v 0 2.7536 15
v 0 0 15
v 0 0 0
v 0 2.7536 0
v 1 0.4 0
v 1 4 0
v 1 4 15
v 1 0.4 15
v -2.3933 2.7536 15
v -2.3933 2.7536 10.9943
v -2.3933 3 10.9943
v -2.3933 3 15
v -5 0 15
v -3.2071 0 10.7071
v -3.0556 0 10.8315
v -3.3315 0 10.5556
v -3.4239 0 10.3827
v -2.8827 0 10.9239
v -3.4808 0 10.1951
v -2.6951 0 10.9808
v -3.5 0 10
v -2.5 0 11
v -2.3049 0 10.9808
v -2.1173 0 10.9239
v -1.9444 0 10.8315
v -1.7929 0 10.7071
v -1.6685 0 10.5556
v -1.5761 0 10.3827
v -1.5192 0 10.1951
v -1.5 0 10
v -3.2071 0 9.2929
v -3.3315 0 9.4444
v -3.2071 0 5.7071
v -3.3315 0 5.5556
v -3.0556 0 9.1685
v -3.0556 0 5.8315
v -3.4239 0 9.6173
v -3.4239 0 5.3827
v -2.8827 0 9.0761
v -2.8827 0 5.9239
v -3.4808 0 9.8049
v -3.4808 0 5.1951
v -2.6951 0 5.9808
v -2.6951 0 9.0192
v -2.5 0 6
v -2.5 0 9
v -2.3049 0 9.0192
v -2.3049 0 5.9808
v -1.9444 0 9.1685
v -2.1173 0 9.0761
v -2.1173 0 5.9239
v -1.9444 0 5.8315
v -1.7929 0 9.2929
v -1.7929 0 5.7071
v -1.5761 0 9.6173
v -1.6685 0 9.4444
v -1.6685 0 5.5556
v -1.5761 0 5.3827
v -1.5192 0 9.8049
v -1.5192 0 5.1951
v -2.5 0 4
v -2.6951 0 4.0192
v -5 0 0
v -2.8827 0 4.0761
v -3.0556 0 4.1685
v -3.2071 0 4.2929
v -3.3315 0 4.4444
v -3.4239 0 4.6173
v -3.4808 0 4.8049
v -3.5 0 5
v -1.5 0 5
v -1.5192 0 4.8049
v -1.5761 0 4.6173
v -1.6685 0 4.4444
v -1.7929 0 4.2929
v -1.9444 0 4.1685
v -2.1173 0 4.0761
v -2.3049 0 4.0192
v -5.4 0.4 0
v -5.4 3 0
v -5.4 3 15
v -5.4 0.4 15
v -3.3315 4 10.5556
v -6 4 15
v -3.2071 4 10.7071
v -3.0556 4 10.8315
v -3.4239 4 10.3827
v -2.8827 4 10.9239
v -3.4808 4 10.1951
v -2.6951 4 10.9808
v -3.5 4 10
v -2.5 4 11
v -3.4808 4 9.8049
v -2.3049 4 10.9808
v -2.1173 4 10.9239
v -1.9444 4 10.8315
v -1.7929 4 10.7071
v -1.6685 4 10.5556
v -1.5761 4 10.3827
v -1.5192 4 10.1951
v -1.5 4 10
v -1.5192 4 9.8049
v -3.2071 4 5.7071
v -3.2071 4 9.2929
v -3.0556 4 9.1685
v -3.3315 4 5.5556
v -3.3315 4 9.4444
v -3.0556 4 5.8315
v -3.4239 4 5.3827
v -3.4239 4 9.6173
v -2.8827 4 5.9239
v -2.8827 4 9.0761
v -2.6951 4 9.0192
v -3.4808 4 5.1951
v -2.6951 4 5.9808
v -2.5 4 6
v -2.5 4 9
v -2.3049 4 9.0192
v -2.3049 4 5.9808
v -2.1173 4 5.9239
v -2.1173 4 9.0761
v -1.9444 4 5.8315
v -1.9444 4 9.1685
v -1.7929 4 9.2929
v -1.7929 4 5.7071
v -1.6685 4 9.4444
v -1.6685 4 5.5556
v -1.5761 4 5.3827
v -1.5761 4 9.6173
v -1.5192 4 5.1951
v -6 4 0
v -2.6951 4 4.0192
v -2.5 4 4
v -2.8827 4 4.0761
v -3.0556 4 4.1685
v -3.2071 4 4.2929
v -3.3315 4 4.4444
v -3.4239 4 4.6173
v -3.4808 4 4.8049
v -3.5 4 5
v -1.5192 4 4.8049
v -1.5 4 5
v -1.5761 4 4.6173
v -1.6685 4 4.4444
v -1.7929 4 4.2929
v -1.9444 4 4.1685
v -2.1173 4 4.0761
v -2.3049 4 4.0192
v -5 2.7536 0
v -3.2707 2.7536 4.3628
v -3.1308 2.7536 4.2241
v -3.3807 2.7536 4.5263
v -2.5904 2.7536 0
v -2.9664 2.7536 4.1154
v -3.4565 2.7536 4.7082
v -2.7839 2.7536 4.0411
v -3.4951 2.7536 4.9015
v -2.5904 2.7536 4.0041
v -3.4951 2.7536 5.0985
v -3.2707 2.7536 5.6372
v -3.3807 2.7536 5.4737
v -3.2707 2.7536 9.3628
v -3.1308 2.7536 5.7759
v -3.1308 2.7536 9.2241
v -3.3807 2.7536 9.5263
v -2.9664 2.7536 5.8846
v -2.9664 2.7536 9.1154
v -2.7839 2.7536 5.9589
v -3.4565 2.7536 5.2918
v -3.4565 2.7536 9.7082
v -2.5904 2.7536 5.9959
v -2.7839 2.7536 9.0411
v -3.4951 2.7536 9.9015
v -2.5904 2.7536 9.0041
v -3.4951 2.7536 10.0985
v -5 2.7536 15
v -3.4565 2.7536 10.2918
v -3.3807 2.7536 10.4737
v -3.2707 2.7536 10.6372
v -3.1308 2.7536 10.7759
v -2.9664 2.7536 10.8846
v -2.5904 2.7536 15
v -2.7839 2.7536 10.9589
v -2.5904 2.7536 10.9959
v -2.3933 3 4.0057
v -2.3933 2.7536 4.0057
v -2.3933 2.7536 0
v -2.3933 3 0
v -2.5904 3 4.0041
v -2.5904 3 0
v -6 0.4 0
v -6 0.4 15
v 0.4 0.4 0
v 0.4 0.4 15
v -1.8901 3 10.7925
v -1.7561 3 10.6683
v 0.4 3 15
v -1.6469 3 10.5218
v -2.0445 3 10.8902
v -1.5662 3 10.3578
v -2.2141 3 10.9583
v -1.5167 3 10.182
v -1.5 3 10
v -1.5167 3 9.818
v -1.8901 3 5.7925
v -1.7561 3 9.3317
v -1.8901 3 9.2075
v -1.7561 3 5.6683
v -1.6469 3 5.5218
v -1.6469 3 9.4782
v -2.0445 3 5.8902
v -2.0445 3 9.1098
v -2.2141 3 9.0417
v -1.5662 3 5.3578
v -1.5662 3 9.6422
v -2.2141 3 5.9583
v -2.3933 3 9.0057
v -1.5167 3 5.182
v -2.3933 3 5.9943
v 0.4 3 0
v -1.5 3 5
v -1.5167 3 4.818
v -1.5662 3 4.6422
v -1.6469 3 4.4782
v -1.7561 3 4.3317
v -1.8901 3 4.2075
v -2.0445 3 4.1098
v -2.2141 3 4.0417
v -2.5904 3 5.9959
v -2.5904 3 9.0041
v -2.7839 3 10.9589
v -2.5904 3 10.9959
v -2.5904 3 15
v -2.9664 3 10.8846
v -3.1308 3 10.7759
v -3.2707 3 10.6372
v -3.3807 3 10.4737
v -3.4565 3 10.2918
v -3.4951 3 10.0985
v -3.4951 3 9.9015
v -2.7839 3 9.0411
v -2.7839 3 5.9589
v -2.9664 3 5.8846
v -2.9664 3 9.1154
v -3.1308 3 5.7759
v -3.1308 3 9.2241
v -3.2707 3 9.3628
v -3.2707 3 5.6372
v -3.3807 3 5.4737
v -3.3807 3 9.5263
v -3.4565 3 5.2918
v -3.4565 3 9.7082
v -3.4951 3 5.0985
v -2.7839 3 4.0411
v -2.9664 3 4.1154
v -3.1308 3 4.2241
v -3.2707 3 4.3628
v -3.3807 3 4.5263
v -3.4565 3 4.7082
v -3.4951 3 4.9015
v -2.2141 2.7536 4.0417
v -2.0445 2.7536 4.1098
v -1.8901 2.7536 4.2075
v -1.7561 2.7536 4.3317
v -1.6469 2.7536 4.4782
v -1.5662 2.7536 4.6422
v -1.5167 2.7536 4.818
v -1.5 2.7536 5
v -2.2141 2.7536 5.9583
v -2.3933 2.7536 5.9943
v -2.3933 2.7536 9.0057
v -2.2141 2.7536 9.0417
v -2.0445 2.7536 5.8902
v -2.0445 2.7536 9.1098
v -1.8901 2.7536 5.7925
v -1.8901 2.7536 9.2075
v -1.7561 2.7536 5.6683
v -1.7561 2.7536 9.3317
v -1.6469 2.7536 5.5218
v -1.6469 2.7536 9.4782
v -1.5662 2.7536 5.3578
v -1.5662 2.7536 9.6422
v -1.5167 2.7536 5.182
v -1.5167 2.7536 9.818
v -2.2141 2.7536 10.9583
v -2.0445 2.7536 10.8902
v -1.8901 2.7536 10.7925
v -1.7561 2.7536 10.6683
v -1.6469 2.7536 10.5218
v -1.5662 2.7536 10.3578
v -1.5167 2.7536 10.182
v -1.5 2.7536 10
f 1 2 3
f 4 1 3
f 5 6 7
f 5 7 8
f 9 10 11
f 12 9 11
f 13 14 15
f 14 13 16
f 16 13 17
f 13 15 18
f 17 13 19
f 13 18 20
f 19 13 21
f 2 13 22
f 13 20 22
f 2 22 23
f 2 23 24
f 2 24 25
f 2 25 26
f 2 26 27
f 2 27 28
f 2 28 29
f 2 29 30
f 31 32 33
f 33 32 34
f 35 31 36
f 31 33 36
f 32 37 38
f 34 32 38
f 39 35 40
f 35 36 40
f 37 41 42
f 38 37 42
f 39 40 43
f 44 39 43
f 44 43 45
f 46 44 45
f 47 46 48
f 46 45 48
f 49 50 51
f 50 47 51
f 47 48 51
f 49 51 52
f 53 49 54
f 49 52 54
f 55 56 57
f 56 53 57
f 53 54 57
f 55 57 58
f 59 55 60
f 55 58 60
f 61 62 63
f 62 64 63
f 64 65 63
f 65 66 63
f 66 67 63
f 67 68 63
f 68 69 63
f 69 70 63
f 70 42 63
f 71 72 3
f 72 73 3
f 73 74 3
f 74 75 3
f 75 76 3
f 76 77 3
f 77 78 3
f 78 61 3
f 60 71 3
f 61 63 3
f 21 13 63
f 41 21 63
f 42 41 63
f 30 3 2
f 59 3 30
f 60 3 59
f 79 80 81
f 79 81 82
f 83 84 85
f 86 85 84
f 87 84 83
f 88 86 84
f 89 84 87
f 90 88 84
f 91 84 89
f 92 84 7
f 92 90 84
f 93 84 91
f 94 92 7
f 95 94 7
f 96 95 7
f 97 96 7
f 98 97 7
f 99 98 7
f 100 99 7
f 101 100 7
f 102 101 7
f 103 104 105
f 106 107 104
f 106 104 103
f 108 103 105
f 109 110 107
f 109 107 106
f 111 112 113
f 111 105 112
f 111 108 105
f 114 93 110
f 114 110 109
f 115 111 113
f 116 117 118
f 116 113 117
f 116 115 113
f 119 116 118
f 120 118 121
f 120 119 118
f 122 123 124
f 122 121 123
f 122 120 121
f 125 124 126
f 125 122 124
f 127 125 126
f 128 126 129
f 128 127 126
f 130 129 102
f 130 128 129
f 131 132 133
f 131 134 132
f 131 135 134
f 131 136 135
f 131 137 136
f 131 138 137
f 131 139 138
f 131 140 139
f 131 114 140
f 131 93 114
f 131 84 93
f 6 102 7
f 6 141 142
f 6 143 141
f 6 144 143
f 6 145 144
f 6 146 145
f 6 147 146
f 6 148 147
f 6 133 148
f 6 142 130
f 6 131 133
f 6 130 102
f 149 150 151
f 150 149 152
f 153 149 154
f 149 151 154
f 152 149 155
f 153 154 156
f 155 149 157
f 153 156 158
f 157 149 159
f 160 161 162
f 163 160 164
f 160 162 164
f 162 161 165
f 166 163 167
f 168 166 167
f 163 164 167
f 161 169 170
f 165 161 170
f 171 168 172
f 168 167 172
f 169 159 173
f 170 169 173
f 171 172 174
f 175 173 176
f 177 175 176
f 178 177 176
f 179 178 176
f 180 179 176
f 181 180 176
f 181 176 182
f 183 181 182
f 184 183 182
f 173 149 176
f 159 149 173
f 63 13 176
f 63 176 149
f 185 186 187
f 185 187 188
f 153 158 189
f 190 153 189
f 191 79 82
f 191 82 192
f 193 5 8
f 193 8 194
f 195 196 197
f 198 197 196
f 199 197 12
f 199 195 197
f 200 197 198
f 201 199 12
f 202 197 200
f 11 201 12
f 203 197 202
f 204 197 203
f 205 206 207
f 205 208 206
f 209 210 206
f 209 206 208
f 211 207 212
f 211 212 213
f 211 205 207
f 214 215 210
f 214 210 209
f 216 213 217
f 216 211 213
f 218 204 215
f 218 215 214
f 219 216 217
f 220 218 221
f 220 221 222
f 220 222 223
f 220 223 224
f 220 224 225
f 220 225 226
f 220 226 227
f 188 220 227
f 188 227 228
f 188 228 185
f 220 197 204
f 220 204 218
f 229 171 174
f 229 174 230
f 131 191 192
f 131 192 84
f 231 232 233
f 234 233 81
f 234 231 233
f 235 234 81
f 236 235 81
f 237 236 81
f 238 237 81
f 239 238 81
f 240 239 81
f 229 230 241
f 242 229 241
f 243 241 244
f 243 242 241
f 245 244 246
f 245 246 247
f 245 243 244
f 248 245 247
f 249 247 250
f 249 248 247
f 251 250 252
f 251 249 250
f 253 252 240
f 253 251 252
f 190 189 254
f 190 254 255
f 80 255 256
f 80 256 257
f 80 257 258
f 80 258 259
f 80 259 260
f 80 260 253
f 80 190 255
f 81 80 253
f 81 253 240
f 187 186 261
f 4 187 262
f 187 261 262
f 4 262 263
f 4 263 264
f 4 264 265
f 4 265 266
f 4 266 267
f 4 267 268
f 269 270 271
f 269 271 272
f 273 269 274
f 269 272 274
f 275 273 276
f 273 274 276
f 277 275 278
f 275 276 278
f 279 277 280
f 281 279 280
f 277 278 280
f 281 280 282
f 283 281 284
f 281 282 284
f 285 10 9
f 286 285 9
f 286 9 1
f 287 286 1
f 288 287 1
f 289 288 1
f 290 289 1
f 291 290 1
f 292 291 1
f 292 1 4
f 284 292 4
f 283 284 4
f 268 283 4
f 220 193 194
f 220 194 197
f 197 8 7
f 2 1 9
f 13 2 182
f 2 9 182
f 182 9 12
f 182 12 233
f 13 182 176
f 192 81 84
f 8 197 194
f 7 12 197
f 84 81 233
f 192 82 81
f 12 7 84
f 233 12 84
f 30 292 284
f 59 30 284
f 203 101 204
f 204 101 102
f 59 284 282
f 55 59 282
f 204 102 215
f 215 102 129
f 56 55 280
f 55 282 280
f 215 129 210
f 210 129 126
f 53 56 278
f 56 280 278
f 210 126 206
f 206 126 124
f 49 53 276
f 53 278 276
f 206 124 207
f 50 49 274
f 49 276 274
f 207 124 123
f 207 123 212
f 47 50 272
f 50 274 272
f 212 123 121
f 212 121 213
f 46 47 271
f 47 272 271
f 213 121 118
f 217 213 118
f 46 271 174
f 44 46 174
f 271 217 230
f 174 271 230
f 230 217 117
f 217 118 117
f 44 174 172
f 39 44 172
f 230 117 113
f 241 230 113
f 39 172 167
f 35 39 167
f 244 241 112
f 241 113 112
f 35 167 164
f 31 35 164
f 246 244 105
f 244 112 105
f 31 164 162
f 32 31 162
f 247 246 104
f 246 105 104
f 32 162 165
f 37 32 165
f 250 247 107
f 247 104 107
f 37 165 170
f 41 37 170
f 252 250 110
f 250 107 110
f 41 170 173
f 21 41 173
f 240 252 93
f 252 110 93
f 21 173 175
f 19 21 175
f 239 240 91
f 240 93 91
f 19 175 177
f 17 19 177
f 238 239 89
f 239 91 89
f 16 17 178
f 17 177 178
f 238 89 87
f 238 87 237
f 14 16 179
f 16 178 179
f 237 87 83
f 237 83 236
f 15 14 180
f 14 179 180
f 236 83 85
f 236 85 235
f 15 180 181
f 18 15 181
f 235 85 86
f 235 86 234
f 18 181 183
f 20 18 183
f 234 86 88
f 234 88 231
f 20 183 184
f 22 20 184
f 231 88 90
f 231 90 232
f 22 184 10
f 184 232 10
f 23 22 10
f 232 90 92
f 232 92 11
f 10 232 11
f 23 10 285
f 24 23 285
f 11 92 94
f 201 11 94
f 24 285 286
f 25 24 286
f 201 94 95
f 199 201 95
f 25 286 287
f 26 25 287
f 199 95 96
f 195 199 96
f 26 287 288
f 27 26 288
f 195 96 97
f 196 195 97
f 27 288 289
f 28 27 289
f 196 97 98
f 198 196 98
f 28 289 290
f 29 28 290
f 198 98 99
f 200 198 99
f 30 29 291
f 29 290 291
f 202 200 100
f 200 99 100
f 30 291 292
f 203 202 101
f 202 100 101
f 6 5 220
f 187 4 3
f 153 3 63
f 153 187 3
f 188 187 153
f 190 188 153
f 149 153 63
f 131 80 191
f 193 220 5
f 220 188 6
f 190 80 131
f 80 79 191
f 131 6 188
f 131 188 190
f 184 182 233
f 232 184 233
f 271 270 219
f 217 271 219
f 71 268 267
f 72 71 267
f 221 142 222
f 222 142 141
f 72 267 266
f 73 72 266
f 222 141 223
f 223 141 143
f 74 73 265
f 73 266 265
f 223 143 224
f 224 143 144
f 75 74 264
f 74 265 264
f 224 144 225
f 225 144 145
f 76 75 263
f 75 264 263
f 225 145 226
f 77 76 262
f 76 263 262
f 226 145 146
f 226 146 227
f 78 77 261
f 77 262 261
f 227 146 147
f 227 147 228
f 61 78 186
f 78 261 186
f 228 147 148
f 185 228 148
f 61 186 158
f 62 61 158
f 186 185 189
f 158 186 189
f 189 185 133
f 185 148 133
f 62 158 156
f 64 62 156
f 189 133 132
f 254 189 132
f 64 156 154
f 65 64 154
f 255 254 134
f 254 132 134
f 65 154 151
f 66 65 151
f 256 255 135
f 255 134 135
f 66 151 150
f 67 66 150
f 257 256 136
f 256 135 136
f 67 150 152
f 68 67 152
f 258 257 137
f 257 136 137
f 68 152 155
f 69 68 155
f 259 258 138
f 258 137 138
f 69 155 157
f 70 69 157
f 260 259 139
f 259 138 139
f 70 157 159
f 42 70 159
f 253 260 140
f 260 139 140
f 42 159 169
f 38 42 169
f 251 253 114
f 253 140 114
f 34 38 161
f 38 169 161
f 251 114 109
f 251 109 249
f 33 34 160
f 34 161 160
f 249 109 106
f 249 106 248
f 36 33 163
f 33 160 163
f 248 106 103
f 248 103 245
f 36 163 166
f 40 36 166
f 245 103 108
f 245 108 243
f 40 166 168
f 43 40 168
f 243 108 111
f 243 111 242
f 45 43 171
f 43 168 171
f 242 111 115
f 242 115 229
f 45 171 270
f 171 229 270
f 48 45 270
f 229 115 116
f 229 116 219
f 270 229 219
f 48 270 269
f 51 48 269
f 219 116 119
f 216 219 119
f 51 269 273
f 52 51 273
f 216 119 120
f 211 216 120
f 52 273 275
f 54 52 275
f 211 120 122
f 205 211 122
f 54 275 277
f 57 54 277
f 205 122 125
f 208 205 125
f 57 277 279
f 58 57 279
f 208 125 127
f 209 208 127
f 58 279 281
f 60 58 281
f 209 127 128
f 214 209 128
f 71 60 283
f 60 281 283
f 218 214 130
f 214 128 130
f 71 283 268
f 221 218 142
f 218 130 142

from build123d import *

# Parameters (mm, degrees)
SKETCH_1_W          = 5
SKETCH_1_H          = 15
EXTRUDE_1_DEPTH     = 3
EXTRUDE_2_DEPTH     = 15
SKETCH_3_R          = 1
CUT_EXTRUDE_1_DEPTH = 5
SKETCH_5_W          = 2.409632894
SKETCH_5_H          = 0.246400488
SKETCH_5_W_2        = 2.393250689
CUT_EXTRUDE_3_DEPTH = 15
SKETCH_6_W          = 0.6
SKETCH_6_H          = 0.4
CUT_EXTRUDE_4_DEPTH = 15


with BuildPart() as part:
    # 草图1 → 凸台-拉伸1 (new body)
    with BuildSketch(Plane(origin=(0, 0, 0), x_dir=(1, 0, 0), z_dir=(0, 1, 0))):
        with Locations((-2.5, -7.5)):
            Rectangle(SKETCH_1_W, SKETCH_1_H)
    extrude(amount=EXTRUDE_1_DEPTH)

    # 草图2 → 凸台-拉伸2 (add)
    with BuildSketch(Plane(origin=(0, 0, 0), x_dir=(-1, 0, 0), z_dir=(0, 0, -1))):
        Polygon((-0.4, 0), (-0.4, 3), (5.4, 3), (5.4, 0), (6, 0), (6, 4), (-1, 4), (-1, 0), align=None)
    extrude(amount=-EXTRUDE_2_DEPTH)

    # 草图3 → 切除-拉伸1 (cut, through all)
    with BuildSketch(Plane(origin=(0, 4, 0), x_dir=(1, 0, 0), z_dir=(0, 1, 0))):
        with Locations((-2.5, -10)):
            Circle(SKETCH_3_R)
        with Locations((-2.5, -5)):
            Circle(SKETCH_3_R)
    extrude(amount=-CUT_EXTRUDE_1_DEPTH, mode=Mode.SUBTRACT)

    # 草图5 → 切除-拉伸3 (cut)
    with BuildSketch(Plane.XY.offset(15)):
        with Locations((-3.795183553, 2.876799756)):
            Rectangle(SKETCH_5_W, SKETCH_5_H)
        with Locations((-1.196625345, 2.876799756)):
            Rectangle(SKETCH_5_W_2, SKETCH_5_H)
    extrude(amount=-CUT_EXTRUDE_3_DEPTH, mode=Mode.SUBTRACT)

    # 草图6 → 切除-拉伸4 (cut)
    with BuildSketch(Plane(origin=(0, 0, 0), x_dir=(-1, 0, 0), z_dir=(0, 0, -1))):
        with Locations((-0.7, 0.2)):
            Rectangle(SKETCH_6_W, SKETCH_6_H)
        with Locations((5.7, 0.2)):
            Rectangle(SKETCH_6_W, SKETCH_6_H)
    extrude(amount=-CUT_EXTRUDE_4_DEPTH, mode=Mode.SUBTRACT)


solid = part.part
